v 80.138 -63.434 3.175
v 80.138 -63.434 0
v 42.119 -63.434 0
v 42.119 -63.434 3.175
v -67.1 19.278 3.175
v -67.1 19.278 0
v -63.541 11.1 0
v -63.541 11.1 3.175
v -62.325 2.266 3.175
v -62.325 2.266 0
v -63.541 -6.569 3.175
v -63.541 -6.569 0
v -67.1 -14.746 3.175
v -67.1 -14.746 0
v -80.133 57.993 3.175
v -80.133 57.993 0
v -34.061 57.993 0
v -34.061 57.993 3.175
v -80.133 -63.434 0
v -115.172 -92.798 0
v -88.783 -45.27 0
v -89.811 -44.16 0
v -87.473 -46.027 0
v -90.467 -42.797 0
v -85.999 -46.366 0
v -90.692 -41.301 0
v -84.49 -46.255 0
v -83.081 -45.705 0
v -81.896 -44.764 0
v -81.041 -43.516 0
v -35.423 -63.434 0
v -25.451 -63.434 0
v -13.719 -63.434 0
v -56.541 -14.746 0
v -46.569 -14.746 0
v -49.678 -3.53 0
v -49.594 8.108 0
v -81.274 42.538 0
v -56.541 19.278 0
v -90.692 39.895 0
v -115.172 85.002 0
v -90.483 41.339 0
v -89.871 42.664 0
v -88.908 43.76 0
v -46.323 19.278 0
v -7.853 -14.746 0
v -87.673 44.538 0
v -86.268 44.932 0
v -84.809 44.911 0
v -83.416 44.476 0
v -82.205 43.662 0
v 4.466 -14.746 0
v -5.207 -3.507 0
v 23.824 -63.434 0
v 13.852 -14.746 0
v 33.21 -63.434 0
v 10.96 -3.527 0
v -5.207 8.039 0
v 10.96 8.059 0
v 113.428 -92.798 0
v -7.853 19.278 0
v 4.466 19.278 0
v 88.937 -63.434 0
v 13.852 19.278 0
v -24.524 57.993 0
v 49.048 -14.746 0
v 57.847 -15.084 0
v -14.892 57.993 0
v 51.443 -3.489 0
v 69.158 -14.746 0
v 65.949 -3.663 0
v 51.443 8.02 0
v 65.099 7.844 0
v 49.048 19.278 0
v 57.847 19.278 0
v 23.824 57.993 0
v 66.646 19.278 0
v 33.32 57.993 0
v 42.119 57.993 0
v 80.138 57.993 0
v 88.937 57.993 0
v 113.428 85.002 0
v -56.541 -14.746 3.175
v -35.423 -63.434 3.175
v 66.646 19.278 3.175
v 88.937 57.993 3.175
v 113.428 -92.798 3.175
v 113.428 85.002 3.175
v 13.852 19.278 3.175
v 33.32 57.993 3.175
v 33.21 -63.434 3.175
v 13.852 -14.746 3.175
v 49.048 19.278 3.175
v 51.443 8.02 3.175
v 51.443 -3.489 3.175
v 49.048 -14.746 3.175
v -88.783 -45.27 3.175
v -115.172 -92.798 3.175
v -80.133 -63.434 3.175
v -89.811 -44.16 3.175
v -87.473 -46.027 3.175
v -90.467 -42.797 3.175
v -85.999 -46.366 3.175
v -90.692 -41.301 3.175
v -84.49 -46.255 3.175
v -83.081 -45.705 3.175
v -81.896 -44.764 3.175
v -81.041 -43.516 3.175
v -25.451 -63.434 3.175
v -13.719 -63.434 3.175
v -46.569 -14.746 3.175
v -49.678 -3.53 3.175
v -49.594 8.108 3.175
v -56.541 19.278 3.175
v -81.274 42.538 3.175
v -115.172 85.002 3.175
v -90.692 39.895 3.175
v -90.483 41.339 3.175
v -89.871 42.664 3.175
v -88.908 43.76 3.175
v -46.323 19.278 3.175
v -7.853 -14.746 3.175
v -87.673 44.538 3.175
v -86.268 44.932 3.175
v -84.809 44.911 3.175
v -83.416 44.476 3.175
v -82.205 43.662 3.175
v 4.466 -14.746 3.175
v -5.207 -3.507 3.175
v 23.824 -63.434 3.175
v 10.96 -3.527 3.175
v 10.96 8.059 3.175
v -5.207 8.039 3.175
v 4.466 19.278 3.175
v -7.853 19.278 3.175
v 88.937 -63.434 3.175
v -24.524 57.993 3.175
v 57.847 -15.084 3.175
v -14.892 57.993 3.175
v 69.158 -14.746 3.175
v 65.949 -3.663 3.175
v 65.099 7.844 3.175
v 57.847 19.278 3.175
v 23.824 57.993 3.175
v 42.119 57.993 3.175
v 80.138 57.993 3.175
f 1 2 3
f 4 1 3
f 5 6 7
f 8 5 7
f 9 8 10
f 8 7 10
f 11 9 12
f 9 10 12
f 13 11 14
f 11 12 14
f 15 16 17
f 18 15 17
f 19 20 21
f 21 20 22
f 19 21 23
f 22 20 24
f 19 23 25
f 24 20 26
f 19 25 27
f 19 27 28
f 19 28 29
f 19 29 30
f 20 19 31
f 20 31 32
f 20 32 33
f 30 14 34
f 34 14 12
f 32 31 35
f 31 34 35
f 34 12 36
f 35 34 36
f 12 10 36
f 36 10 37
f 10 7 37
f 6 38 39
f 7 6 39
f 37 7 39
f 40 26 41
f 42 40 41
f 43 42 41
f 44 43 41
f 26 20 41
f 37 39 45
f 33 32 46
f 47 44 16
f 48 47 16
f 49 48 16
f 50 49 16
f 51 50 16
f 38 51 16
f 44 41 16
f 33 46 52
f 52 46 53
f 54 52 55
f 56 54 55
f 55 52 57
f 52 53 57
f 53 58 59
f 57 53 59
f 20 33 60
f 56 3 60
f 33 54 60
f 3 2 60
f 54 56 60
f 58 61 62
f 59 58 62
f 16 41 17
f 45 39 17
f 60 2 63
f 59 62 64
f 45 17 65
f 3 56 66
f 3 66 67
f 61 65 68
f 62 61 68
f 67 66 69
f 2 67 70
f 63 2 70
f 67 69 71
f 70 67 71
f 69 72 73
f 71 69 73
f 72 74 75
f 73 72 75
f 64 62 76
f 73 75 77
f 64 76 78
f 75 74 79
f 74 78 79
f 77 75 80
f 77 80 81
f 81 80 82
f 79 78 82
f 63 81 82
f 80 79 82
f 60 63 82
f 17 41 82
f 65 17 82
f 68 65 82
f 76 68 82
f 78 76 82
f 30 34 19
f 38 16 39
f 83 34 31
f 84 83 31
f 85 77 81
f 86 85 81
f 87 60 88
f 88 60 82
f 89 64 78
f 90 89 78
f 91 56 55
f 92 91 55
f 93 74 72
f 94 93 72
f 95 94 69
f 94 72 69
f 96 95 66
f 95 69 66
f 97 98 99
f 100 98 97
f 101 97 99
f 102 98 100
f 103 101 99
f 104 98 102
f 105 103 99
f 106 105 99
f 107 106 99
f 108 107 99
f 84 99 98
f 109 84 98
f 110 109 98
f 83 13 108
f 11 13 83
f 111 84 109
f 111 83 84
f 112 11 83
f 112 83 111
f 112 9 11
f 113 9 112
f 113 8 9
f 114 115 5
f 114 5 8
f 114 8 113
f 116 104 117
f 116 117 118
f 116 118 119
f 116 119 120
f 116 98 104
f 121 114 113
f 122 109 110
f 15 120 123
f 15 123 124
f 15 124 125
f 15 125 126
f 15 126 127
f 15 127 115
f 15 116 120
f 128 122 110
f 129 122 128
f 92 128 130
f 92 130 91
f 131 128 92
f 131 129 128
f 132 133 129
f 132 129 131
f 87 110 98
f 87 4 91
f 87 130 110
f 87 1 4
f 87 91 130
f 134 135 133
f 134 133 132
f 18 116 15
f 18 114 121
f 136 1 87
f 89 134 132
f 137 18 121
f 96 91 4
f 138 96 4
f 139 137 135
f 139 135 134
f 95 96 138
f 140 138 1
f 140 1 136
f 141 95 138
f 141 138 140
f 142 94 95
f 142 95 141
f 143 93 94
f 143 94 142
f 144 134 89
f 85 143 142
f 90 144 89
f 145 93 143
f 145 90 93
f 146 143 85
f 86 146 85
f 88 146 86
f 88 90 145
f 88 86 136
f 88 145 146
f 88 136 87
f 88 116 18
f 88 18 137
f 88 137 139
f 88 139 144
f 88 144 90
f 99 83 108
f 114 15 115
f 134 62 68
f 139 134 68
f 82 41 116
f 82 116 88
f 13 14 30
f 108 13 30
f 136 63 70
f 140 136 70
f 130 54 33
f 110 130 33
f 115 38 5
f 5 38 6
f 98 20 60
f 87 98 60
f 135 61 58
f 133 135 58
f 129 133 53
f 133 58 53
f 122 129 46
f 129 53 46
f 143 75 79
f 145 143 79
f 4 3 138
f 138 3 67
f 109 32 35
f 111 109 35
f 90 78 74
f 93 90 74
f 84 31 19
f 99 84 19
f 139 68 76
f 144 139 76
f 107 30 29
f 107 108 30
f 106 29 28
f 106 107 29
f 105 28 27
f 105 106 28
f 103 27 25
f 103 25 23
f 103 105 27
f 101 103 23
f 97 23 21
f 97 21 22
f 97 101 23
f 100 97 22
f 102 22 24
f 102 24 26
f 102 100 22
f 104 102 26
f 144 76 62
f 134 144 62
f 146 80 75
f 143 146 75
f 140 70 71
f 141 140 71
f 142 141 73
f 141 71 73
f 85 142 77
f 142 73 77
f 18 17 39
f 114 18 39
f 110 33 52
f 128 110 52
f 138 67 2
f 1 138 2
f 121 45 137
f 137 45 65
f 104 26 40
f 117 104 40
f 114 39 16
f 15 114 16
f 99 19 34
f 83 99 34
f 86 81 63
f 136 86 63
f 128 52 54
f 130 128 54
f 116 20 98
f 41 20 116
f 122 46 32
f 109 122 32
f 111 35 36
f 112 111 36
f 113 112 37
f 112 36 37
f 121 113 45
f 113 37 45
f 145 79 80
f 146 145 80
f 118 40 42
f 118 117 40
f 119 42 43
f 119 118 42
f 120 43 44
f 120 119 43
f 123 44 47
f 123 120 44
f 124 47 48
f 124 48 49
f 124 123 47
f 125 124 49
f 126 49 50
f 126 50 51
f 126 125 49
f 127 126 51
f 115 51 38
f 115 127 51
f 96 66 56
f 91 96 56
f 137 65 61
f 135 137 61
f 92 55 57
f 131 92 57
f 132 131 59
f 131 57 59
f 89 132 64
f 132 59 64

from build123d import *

# Parameters (mm, degrees)
F0_W     = 228.6
F0_H     = 177.8
F1_DEPTH = 3.175
F2_R     = 5.08


with BuildPart() as f1:
    # F0 (on Top) → F1 (new body)
    with BuildSketch(Plane.XY):
        with Locations((-0.871601, -3.897959)):
            Rectangle(F0_W, F0_H)
        Polygon((-35.42317, -63.4338), (-80.133474, -63.4338), (-56.54095, -14.745583), align=None, mode=Mode.SUBTRACT)
        Polygon((23.823941, -63.4338), (-13.718781, -63.4338), (4.465975, -14.745583), align=None, mode=Mode.SUBTRACT)
        Polygon((80.13803, -63.4338), (42.118688, -63.4338), (57.847038, -15.083696), align=None, mode=Mode.SUBTRACT)
        with BuildLine():
            Line((-90.692364, -63.4338), (-90.692364, 57.993443))
            Line((-90.692364, 57.993443), (-67.099841, 19.27751))
            ThreePointArc((-67.099841, 19.27751), (-62.324984, 2.265963), (-67.099841, -14.745583))
            Line((-67.099841, -14.745583), (-90.692364, -63.4338))
        make_face(mode=Mode.SUBTRACT)
        with BuildLine():
            ThreePointArc((-46.568668, -14.745583), (-50.040228, 2.291953), (-46.322669, 19.27751))
            Line((-46.322669, 19.27751), (-24.523671, 57.993443))
            Line((-24.523671, 57.993443), (-7.852732, 19.27751))
            ThreePointArc((-7.852732, 19.27751), (-4.872698, 2.265963), (-7.852732, -14.745583))
            Line((-7.852732, -14.745583), (-25.450888, -63.4338))
            Line((-25.450888, -63.4338), (-46.568668, -14.745583))
        make_face(mode=Mode.SUBTRACT)
        Polygon((-56.54095, 19.27751), (-80.133474, 57.993443), (-34.060732, 57.993443), align=None, mode=Mode.SUBTRACT)
        with BuildLine():
            Line((49.04796, -14.745583), (33.209621, -63.4338))
            Line((33.209621, -63.4338), (13.851655, -14.745583))
            ThreePointArc((13.851655, -14.745583), (10.593866, 2.265963), (13.851655, 19.27751))
            Line((13.851655, 19.27751), (33.31961, 57.993443))
            Line((33.31961, 57.993443), (49.04796, 19.27751))
            ThreePointArc((49.04796, 19.27751), (51.745333, 2.265963), (49.04796, -14.745583))
        make_face(mode=Mode.SUBTRACT)
        Polygon((4.465975, 19.27751), (-14.891991, 57.993443), (23.823941, 57.993443), align=None, mode=Mode.SUBTRACT)
        with BuildLine():
            Line((66.646114, 19.27751), (88.937106, 57.993443))
            Line((88.937106, 57.993443), (88.937106, -63.4338))
            Line((88.937106, -63.4338), (69.157515, -14.745583))
            ThreePointArc((69.157515, -14.745583), (65.224515, 2.06834), (66.646114, 19.27751))
        make_face(mode=Mode.SUBTRACT)
        Polygon((57.847038, 19.27751), (42.118688, 57.993443), (80.13803, 57.993443), align=None, mode=Mode.SUBTRACT)
    extrude(amount=F1_DEPTH)

    # F2
    f2_edges = [f1.edges().sort_by_distance(p)[0] for p in [
        (-90.692364, -63.4338, 1.5875),
        (-90.692364, 57.993443, 1.5875),
    ]]
    fillet(f2_edges, radius=F2_R)


solid = f1.part
